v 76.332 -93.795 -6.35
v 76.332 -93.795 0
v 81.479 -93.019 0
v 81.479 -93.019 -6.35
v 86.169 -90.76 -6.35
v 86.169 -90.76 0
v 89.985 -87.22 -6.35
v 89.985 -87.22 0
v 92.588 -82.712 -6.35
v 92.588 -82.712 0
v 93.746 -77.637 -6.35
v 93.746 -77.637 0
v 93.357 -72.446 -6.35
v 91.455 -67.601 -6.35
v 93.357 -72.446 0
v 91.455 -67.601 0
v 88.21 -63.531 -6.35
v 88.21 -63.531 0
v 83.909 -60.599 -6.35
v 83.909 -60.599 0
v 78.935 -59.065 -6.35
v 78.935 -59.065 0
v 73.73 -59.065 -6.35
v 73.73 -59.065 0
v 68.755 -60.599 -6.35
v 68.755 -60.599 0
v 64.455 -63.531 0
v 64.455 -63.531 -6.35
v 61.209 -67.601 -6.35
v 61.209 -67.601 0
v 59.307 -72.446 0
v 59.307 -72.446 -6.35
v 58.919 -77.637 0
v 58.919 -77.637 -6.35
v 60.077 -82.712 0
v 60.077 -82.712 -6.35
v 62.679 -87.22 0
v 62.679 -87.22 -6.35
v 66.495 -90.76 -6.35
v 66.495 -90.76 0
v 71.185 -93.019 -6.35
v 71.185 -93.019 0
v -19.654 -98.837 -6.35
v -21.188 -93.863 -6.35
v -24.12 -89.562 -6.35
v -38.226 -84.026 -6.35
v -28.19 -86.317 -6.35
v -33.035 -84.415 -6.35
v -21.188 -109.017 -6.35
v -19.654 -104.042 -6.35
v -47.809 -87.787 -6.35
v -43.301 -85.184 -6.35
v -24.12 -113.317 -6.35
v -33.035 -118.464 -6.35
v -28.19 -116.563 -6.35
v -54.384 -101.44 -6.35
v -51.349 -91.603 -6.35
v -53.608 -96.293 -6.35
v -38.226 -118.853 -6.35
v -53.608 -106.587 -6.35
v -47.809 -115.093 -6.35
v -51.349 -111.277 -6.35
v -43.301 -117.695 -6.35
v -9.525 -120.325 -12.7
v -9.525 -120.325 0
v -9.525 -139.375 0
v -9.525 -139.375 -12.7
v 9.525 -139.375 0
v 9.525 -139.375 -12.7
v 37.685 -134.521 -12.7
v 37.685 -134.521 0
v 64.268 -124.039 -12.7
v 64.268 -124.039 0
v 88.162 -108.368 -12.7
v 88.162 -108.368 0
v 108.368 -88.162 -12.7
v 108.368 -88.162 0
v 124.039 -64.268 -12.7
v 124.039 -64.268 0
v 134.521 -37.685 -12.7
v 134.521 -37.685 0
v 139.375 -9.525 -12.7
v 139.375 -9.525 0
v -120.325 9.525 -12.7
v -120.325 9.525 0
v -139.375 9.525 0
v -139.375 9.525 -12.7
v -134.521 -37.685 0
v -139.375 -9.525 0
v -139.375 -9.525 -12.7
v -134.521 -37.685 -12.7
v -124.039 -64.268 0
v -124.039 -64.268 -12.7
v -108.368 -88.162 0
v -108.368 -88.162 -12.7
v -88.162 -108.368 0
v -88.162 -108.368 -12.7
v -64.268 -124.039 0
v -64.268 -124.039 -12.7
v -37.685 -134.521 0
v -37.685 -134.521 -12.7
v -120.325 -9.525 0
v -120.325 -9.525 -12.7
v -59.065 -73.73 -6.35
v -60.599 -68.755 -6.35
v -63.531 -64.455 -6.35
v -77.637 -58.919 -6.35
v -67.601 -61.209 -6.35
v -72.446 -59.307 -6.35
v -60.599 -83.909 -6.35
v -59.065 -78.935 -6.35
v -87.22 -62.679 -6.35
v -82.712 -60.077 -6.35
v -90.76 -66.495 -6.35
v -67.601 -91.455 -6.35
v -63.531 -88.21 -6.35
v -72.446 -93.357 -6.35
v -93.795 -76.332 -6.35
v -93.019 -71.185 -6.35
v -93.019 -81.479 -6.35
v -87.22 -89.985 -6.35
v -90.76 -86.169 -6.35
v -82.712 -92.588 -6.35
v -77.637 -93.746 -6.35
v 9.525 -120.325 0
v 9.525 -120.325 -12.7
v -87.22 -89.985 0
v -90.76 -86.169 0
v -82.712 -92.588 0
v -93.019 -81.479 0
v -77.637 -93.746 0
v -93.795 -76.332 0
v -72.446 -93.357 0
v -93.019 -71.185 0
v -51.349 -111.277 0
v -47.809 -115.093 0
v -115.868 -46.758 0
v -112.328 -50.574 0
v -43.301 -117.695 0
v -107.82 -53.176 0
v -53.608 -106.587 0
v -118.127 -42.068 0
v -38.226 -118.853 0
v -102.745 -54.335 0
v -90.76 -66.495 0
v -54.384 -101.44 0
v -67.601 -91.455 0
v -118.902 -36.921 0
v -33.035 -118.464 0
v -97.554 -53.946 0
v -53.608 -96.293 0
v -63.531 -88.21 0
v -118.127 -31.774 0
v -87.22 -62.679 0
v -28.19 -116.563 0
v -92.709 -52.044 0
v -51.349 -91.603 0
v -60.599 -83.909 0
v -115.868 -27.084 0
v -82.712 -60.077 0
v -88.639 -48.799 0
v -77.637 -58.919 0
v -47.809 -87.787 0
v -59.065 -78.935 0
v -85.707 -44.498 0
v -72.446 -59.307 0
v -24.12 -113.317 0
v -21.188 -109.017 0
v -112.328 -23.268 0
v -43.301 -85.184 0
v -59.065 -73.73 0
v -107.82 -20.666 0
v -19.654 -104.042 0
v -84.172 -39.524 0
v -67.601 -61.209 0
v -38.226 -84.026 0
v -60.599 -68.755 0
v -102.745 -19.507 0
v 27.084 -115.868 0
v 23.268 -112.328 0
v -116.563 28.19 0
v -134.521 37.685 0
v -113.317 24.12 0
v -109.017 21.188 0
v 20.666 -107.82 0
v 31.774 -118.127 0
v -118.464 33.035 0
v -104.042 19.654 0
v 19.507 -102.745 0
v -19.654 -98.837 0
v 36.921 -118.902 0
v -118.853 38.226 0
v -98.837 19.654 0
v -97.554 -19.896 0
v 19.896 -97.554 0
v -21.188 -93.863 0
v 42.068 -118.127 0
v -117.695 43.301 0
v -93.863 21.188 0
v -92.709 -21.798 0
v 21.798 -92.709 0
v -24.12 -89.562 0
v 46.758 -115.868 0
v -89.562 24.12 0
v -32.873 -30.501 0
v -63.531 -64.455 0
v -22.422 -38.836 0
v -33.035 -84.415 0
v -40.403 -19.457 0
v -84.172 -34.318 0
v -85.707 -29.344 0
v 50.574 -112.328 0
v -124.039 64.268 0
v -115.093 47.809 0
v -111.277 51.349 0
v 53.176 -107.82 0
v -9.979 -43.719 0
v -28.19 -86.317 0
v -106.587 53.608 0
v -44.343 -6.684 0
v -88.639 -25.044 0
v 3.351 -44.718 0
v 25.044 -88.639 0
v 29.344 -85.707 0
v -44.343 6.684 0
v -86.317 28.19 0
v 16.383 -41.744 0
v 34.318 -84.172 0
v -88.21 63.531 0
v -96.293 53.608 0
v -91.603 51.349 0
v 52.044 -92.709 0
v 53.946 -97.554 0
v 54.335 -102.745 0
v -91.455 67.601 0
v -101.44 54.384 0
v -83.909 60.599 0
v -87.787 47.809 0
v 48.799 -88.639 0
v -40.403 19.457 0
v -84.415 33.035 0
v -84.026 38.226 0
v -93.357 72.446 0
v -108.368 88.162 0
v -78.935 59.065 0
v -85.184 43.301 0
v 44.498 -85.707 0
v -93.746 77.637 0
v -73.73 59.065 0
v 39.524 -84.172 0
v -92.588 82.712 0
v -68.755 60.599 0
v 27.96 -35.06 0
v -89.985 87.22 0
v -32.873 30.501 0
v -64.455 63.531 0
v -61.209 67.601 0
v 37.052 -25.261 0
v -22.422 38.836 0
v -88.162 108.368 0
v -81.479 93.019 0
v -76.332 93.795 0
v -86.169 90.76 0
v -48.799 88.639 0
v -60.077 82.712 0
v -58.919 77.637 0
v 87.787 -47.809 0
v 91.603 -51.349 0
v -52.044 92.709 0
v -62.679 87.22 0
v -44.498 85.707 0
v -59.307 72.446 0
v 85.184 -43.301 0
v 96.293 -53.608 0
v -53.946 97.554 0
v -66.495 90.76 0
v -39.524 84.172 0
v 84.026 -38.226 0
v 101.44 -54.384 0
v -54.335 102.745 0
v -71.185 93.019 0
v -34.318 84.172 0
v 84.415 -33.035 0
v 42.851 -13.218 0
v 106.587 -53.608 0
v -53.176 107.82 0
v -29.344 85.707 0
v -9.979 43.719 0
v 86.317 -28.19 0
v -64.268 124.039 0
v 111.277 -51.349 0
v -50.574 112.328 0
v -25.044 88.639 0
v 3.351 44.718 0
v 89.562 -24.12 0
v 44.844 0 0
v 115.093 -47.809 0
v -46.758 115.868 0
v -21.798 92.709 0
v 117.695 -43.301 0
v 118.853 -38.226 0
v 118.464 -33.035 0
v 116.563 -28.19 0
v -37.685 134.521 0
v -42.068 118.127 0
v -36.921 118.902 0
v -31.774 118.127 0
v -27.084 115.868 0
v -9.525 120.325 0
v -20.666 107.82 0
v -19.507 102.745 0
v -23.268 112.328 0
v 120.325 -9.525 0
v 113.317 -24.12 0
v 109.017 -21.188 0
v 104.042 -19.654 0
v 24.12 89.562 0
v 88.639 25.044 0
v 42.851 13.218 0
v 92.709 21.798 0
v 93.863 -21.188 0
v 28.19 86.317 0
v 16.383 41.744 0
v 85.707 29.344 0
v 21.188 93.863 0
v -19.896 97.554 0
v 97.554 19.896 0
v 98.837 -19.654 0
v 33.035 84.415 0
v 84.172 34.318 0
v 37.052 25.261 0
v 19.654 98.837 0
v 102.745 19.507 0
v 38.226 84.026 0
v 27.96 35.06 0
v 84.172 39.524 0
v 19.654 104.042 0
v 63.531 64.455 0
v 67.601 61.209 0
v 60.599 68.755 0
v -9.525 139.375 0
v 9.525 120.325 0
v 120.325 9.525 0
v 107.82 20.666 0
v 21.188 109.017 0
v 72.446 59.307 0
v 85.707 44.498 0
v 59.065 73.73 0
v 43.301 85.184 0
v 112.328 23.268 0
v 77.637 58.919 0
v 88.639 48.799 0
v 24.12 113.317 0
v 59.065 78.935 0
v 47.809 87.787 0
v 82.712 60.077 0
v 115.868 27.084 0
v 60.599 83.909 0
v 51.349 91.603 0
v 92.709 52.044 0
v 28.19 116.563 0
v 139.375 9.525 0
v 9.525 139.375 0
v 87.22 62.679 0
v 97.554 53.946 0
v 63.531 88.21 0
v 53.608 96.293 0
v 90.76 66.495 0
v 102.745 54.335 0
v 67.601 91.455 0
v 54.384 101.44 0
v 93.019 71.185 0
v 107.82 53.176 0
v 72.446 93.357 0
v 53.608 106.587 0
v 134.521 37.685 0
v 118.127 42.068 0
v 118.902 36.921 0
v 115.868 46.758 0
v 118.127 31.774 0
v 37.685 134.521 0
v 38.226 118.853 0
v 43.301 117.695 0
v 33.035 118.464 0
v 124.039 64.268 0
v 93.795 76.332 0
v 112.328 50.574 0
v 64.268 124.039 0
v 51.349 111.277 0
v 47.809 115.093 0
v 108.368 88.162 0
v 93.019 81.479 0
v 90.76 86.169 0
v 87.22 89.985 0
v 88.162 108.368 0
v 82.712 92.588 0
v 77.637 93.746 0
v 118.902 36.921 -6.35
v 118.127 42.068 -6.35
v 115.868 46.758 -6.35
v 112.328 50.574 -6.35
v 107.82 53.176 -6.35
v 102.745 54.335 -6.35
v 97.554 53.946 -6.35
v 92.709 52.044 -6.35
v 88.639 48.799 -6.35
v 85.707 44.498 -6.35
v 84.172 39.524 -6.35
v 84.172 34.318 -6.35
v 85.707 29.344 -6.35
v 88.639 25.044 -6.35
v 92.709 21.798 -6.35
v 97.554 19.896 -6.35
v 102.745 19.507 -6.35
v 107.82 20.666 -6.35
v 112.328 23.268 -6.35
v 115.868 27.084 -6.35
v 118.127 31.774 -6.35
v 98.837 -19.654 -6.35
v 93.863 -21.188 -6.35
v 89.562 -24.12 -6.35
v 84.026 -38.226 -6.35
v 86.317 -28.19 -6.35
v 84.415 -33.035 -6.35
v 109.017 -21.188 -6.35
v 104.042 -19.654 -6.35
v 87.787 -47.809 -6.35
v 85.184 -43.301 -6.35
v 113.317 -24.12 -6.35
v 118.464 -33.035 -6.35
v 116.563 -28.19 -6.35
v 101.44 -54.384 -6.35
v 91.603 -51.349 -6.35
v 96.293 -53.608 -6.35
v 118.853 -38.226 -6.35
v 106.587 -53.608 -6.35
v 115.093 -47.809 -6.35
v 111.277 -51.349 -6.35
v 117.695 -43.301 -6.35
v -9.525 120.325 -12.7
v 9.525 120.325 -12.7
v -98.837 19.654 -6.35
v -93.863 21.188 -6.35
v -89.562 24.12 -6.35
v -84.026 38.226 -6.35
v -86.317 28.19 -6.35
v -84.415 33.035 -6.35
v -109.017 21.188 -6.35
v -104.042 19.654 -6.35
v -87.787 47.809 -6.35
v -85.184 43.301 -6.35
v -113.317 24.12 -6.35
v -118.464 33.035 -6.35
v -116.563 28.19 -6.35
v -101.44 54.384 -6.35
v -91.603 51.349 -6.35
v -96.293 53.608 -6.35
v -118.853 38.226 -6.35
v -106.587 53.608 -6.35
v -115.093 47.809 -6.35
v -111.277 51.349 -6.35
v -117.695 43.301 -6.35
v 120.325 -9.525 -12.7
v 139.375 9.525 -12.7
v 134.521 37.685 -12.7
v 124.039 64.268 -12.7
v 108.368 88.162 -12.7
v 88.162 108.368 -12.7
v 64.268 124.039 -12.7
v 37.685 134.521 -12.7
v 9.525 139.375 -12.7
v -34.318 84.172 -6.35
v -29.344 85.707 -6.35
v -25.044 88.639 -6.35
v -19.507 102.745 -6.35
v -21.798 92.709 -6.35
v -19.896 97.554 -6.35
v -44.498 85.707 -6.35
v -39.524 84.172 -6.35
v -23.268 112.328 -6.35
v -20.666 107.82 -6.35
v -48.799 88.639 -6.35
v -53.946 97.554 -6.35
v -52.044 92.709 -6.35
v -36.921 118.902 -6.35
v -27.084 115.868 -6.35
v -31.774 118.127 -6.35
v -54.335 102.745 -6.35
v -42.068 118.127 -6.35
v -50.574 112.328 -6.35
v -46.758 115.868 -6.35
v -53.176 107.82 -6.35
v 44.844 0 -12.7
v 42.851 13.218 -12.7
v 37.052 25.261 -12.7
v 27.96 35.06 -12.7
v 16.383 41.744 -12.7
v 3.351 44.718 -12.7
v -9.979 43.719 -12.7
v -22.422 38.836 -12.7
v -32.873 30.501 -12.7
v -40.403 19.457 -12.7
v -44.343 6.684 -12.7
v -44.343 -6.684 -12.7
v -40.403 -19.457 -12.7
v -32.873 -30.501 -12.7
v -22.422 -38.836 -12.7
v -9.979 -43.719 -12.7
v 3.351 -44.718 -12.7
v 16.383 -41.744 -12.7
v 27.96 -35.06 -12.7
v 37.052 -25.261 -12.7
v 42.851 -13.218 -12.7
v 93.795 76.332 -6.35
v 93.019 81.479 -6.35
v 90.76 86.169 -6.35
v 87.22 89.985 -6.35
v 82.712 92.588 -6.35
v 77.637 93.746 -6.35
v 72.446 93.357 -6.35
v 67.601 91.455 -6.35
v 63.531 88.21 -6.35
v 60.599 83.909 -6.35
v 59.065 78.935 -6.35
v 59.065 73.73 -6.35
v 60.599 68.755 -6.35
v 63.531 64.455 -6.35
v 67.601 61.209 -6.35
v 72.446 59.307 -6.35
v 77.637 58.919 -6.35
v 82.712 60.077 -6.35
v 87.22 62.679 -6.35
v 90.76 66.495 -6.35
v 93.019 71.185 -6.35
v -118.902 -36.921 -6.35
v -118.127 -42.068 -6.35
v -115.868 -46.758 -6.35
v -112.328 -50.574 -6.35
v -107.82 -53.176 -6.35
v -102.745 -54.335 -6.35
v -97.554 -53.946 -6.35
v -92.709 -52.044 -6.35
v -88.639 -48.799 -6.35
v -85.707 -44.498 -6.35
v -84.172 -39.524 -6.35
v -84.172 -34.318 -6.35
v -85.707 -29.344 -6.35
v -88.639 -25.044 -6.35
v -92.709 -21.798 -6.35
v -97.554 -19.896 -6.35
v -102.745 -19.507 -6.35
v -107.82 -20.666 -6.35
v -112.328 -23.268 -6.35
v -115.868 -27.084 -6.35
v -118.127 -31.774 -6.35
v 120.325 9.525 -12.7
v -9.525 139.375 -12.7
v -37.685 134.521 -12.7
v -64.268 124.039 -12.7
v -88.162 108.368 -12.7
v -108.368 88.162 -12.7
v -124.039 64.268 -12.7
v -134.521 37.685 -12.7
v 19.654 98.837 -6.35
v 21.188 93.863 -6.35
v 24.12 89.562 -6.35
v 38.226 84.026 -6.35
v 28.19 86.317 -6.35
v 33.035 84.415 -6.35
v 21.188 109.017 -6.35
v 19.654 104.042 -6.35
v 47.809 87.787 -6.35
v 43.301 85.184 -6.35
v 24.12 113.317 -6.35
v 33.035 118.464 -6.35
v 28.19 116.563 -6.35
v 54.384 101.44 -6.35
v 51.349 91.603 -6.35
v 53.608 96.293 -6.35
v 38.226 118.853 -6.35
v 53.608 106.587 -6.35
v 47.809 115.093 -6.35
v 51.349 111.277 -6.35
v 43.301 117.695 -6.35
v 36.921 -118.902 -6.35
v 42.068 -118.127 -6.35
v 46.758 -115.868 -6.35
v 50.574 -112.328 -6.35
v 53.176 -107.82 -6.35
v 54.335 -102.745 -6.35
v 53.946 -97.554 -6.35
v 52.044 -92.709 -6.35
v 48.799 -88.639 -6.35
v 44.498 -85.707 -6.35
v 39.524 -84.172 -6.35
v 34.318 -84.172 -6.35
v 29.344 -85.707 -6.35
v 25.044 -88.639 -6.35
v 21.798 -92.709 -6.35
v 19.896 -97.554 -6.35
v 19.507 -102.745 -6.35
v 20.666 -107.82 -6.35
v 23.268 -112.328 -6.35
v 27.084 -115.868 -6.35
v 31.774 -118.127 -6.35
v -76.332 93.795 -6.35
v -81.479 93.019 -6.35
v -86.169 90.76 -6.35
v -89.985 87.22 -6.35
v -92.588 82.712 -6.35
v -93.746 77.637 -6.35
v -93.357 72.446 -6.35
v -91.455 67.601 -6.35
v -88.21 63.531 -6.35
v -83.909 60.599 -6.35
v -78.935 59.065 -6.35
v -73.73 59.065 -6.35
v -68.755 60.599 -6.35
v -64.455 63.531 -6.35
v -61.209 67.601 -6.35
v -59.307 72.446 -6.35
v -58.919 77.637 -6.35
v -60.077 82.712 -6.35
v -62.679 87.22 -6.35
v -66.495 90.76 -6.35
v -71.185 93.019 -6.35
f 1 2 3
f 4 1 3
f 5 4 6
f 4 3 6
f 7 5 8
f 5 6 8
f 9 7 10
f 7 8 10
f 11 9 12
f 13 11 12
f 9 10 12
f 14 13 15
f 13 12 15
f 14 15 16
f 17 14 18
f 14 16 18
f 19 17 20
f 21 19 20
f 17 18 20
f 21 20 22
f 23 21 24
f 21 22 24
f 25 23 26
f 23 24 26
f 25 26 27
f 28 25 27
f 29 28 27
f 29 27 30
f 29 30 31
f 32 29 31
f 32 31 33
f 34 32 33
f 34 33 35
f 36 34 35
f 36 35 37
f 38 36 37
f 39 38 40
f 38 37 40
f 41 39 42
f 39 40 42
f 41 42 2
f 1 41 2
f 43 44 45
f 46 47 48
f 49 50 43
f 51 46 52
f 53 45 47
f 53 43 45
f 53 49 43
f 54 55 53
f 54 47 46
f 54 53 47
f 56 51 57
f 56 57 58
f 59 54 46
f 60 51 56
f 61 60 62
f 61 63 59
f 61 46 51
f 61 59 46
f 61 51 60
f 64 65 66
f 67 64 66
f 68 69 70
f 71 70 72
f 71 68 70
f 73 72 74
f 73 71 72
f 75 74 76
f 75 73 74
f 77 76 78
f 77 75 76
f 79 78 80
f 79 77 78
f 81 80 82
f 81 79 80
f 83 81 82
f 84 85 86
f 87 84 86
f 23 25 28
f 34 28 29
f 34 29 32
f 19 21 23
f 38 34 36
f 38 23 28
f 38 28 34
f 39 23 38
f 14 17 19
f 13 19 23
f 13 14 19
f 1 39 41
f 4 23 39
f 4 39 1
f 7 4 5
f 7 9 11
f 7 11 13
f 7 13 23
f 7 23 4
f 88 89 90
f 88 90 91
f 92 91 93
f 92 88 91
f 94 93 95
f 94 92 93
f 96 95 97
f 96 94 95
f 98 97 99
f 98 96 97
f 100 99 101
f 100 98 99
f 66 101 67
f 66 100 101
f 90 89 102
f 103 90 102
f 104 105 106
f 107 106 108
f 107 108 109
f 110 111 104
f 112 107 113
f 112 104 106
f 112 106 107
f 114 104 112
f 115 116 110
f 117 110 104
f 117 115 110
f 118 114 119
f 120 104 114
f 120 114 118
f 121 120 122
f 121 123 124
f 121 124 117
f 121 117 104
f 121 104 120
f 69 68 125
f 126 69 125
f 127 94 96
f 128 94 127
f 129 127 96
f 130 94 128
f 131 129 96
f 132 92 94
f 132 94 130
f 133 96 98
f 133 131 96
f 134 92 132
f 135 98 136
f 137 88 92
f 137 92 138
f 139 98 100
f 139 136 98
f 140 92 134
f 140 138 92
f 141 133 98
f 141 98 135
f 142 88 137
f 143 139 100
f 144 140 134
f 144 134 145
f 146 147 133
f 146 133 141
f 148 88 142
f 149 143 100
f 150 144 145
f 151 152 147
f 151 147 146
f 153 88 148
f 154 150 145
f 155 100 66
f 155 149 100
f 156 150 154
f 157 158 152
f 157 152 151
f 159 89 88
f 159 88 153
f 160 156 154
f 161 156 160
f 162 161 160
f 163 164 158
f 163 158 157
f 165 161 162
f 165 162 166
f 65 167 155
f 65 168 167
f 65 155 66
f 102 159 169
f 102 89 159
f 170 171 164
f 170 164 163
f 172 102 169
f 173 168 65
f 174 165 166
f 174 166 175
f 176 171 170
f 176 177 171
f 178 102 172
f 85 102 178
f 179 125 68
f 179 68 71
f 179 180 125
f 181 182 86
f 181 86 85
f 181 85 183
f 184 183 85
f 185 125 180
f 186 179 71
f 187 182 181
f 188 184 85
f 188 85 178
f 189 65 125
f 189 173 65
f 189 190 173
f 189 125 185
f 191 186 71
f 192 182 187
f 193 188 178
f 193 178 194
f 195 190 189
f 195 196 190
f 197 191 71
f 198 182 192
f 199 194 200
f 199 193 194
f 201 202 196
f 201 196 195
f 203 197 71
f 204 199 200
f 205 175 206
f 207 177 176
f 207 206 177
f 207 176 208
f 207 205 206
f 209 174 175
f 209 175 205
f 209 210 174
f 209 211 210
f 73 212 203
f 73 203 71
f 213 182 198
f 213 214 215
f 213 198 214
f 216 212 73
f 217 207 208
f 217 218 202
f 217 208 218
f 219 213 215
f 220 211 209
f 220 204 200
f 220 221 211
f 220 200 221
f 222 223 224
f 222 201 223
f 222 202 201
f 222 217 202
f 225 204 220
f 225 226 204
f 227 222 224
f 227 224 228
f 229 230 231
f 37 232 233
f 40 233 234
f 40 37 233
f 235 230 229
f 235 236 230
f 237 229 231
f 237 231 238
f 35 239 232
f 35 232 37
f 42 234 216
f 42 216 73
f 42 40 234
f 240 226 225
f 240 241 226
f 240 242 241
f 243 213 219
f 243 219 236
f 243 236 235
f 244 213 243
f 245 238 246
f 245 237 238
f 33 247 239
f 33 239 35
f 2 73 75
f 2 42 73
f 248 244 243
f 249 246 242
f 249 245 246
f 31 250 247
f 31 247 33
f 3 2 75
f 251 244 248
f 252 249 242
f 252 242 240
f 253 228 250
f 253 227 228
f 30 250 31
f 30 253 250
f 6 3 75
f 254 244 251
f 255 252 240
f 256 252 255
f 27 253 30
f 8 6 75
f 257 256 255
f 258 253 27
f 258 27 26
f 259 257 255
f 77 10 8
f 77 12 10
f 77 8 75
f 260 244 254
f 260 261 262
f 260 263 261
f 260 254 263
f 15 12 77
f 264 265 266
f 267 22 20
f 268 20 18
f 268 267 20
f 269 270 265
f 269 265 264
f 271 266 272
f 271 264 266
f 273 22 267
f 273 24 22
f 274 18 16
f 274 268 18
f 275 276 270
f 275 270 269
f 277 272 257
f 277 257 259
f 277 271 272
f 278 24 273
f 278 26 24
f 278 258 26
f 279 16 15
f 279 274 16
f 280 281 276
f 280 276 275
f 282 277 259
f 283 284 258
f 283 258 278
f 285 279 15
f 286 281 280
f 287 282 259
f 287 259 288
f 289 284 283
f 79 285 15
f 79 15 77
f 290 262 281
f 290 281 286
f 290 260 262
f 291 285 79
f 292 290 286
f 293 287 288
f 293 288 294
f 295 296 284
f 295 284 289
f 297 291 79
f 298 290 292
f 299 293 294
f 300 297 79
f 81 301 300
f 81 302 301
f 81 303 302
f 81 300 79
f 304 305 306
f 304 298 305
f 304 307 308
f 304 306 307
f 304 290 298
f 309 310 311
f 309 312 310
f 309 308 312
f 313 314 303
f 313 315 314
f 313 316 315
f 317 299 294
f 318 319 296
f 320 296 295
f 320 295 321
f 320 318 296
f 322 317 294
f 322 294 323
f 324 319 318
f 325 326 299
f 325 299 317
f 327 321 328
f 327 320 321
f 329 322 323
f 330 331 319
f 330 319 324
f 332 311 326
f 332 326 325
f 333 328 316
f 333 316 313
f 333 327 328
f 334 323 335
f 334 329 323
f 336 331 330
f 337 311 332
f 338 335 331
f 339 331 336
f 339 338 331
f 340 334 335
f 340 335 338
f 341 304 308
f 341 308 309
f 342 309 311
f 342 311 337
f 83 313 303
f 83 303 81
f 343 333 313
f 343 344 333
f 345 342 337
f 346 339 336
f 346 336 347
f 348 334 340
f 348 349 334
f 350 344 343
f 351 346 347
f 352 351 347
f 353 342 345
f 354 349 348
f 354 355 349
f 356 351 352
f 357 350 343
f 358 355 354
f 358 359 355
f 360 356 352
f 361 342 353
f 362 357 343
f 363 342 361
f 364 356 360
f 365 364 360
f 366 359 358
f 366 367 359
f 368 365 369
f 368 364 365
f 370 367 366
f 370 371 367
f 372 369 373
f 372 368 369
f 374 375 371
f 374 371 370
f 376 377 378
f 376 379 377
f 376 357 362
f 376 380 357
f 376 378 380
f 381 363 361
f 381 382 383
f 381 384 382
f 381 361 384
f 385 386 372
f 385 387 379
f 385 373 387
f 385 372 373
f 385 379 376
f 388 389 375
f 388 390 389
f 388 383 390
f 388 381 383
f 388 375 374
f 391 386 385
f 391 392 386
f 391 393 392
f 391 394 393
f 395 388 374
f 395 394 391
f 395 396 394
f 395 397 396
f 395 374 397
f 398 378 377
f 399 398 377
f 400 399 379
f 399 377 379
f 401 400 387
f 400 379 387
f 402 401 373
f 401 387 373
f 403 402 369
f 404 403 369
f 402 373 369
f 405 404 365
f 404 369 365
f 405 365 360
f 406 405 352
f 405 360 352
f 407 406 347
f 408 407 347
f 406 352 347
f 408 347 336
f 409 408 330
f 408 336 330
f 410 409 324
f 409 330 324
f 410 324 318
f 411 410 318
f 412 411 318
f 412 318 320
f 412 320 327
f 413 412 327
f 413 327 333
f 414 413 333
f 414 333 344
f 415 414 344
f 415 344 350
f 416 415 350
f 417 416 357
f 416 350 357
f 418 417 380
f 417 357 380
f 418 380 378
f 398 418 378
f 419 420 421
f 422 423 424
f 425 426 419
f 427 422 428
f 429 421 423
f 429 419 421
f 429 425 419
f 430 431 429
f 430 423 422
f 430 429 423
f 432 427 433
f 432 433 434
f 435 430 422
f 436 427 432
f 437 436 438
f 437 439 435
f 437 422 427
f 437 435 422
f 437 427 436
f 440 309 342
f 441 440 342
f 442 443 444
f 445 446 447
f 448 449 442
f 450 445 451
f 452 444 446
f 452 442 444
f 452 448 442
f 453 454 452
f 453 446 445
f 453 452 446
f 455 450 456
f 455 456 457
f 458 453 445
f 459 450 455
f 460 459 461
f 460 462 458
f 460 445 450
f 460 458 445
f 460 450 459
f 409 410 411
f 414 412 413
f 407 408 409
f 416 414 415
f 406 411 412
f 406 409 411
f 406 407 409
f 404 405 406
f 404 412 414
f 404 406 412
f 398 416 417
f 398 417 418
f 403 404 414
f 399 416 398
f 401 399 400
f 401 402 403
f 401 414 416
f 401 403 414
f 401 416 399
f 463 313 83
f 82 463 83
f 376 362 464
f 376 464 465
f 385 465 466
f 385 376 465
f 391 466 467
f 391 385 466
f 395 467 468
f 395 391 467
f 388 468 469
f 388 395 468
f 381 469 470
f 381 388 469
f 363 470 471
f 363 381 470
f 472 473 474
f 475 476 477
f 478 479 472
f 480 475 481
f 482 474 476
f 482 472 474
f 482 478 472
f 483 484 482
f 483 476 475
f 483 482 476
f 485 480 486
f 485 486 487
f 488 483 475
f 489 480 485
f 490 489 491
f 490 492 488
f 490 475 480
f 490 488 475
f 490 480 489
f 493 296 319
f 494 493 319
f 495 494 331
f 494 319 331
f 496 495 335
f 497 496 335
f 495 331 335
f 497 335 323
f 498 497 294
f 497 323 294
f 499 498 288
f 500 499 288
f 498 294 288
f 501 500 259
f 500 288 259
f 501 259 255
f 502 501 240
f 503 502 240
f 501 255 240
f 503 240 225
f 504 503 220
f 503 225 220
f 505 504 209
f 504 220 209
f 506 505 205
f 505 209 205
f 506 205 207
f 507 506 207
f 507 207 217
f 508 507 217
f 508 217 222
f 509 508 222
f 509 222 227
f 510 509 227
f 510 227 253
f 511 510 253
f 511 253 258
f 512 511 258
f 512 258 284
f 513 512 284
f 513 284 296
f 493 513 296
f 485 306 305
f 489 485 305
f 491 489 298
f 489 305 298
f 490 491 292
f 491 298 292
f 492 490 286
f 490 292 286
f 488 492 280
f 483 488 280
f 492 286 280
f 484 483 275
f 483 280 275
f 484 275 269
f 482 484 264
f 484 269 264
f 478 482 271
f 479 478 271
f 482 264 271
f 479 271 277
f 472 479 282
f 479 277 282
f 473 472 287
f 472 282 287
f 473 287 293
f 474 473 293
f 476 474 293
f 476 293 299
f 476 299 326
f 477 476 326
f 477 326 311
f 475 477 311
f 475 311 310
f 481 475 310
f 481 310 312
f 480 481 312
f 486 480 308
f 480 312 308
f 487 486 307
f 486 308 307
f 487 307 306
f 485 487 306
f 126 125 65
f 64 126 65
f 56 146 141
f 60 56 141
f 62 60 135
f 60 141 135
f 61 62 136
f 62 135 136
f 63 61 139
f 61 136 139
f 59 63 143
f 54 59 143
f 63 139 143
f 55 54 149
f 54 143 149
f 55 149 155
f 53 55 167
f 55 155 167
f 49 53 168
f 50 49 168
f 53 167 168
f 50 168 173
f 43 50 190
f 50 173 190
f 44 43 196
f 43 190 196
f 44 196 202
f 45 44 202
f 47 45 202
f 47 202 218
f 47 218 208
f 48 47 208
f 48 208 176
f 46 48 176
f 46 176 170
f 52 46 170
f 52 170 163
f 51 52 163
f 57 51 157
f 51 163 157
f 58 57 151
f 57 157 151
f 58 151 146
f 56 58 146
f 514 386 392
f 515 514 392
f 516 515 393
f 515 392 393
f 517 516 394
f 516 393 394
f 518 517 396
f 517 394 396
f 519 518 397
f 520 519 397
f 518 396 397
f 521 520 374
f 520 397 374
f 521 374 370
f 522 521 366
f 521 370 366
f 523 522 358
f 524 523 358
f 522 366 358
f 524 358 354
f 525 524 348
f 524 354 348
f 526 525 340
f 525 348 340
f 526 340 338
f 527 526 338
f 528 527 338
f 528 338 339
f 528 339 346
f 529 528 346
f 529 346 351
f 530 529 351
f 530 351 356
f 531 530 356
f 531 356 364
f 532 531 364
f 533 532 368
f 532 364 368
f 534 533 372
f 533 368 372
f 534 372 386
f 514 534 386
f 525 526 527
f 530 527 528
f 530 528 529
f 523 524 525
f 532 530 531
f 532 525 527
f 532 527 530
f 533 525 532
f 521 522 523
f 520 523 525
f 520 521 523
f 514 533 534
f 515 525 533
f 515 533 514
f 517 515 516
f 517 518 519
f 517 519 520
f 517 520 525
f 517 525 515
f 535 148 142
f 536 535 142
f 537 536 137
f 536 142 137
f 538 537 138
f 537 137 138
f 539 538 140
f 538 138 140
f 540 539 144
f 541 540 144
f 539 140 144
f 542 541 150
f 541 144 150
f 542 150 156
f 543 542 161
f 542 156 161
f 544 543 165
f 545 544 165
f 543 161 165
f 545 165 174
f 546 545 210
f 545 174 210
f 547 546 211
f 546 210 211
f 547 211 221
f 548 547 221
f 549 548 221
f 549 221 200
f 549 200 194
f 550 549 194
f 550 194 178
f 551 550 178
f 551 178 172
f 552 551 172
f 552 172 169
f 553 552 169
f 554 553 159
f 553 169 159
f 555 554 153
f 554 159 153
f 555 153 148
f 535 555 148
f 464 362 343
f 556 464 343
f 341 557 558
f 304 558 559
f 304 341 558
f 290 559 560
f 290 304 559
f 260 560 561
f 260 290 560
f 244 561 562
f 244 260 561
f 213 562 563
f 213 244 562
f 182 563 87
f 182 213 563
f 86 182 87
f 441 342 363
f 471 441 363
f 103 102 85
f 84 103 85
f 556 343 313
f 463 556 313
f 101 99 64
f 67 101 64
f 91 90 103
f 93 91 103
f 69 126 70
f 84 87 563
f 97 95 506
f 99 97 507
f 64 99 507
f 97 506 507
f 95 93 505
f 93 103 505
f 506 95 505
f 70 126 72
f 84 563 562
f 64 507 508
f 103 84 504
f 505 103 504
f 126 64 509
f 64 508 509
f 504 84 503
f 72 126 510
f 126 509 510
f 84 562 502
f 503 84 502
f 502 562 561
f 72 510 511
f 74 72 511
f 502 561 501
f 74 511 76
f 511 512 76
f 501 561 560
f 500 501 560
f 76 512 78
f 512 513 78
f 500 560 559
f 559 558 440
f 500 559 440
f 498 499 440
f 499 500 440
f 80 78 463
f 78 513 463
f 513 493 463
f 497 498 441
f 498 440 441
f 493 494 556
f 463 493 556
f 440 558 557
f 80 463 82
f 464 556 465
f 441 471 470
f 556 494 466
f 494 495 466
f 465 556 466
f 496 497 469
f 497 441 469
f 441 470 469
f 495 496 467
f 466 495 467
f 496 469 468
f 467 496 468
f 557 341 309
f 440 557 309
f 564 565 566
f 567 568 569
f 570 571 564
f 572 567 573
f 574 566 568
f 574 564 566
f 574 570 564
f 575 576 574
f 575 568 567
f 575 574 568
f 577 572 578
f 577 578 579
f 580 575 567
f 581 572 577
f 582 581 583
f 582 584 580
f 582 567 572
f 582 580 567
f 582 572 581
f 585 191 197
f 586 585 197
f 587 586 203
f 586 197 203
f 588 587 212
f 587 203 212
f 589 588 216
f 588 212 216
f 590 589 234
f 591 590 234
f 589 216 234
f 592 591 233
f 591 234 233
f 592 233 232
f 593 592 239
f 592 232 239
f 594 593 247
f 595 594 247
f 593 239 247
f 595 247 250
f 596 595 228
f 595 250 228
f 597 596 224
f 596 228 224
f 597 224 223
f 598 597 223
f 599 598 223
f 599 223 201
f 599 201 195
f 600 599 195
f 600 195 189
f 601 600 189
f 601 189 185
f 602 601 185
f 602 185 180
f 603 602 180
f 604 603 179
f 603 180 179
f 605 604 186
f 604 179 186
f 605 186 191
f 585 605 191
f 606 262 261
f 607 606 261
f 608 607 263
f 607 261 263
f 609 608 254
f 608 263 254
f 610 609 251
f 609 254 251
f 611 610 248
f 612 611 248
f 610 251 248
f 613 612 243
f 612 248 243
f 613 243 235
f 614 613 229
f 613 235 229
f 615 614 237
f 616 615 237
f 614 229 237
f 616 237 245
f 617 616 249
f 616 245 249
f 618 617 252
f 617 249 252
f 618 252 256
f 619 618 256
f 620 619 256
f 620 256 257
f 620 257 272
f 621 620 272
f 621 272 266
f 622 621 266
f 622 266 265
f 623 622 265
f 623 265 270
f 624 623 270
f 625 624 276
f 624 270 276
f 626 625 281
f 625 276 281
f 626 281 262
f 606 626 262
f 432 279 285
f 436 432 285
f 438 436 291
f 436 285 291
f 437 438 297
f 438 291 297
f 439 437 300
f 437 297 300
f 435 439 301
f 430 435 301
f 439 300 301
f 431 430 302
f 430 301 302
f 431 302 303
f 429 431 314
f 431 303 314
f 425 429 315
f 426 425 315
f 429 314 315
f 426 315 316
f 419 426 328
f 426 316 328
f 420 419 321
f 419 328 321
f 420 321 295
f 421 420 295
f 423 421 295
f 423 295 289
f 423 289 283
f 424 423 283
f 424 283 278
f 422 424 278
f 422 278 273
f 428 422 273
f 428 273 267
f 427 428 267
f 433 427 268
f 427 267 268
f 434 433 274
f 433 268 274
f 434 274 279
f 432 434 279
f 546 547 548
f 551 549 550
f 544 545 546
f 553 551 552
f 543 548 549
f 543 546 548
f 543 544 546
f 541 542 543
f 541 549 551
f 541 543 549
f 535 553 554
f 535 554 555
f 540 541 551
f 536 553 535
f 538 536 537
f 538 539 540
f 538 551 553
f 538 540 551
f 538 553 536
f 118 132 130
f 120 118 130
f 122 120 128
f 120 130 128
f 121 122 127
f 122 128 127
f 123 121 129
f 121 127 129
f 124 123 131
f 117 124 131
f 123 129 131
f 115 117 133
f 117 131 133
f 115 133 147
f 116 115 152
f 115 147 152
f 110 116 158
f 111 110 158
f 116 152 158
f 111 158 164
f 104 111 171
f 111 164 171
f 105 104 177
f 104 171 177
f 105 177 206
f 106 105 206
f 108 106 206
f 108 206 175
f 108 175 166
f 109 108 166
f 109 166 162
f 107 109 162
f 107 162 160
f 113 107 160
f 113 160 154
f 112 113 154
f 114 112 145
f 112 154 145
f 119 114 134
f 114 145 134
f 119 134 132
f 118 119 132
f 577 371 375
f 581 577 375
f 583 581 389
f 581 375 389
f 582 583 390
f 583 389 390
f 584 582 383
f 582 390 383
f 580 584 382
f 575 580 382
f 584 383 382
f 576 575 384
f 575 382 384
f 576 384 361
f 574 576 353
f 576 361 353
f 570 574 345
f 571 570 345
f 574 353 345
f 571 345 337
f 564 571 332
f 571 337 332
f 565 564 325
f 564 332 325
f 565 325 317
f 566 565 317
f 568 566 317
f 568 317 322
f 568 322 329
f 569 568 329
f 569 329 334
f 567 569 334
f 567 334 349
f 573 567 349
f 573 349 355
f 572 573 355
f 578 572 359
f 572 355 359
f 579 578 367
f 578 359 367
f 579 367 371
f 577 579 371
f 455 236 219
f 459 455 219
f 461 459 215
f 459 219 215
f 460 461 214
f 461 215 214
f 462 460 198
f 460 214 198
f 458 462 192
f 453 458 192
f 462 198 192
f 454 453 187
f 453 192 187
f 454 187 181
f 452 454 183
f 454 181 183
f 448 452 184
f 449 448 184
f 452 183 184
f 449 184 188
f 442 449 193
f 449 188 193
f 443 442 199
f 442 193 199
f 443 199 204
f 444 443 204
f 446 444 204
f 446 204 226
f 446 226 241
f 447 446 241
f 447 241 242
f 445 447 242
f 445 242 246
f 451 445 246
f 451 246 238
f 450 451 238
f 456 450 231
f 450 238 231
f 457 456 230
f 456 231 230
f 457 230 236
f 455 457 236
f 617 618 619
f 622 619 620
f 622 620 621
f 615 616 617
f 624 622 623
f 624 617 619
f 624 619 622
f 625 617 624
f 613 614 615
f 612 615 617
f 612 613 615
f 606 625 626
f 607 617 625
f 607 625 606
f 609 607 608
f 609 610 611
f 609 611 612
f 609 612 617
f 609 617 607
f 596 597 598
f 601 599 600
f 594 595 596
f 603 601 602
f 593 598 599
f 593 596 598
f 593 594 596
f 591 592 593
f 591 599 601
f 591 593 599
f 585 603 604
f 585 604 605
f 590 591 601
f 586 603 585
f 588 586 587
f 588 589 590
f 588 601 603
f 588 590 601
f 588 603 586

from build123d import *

# Parameters (mm, degrees)
F0_R            = 44.8437
F0_R_2          = 17.4625
F0_W            = 19.05
F0_H            = 6.35
F1_DEPTH        = 12.7
F2_DEPTH        = 6.35
F2_COPIES_COUNT = 4
F3_DEPTH        = 12.701
F3_COPIES_COUNT = 4
F5_DEPTH        = 25.4


# Not quite as in the source:
# - a pattern or mirror of a feature is missing from the dataset's text; its kind, count and spacing are read off the source's solid


with BuildPart() as f1:
    # F0 (on Top) → F1 (new body)
    with BuildSketch(Plane.XY):
        with BuildLine():
            ThreePointArc((-9.525, 139.3749058296), (-95.3557746023, -102.0948884617), (139.7, 0))
            ThreePointArc((139.7, 0), (102.0948884617, 95.3557746023), (9.525, 139.3749058296))
            Line((9.525, 139.3749058296), (9.525, 120.3249058296))
            Line((9.525, 120.3249058296), (9.525, 113.9749058296))
            Line((9.525, 113.9749058296), (-9.525, 113.9749058296))
            Line((-9.525, 113.9749058296), (-9.525, 120.3249058296))
            Line((-9.525, 120.3249058296), (-9.525, 139.3749058296))
        make_face()
        Circle(F0_R, mode=Mode.SUBTRACT)
        with Locations((101.4398184138, 36.921074472)):
            Circle(F0_R_2, mode=Mode.SUBTRACT)
        with Locations((36.921074472, 101.4398184138)):
            Circle(F0_R_2, mode=Mode.SUBTRACT)
        with Locations((76.3321770291, 76.3321770291)):
            Circle(F0_R_2, mode=Mode.SUBTRACT)
        with BuildLine():
            Line((9.525, 120.3249058296), (9.525, 139.3749058296))
            ThreePointArc((9.525, 139.3749058296), (0, 139.7), (-9.525, 139.3749058296))
            Line((-9.525, 139.3749058296), (-9.525, 120.3249058296))
            Line((-9.525, 120.3249058296), (9.525, 120.3249058296))
        make_face()
        with Locations((36.921074472, 101.4398184138)):
            Circle(F0_R_2)
        with Locations((76.3321770291, 76.3321770291)):
            Circle(F0_R_2)
        with Locations((101.4398184138, 36.921074472)):
            Circle(F0_R_2)
        with Locations((0, 117.1499058296)):
            Rectangle(F0_W, F0_H)
        Circle(F0_R)
    extrude(amount=-F1_DEPTH)

    # F0 (on Top) → F2 (cut)
    with BuildSketch(Plane.XY):
        with Locations((36.921074472, 101.4398184138)):
            Circle(F0_R_2)
        with Locations((76.3321770291, 76.3321770291)):
            Circle(F0_R_2)
        with Locations((101.4398184138, 36.921074472)):
            Circle(F0_R_2)
    f2 = extrude(amount=-F2_DEPTH, mode=Mode.SUBTRACT)

    # F2_copies: F2 ×4 about axis
    f2_copies_axis = Axis((0, 0, 0), (0, 0, 1))
    for i in range(1, F2_COPIES_COUNT):
        add(f2.rotate(f2_copies_axis, i * 360 / F2_COPIES_COUNT), mode=Mode.SUBTRACT)

    # F0 (on Top) → F3 (cut, through all)
    with BuildSketch(Plane.XY):
        with BuildLine():
            Line((9.525, 120.3249058296), (9.525, 139.3749058296))
            ThreePointArc((9.525, 139.3749058296), (0, 139.7), (-9.525, 139.3749058296))
            Line((-9.525, 139.3749058296), (-9.525, 120.3249058296))
            Line((-9.525, 120.3249058296), (9.525, 120.3249058296))
        make_face()
    f3 = extrude(amount=-F3_DEPTH, mode=Mode.SUBTRACT)

    # F3_copies: F3 ×4 about axis
    f3_copies_axis = Axis((0, 0, 0), (0, 0, 1))
    for i in range(1, F3_COPIES_COUNT):
        add(f3.rotate(f3_copies_axis, i * 360 / F3_COPIES_COUNT), mode=Mode.SUBTRACT)

    # F0 (on Top) → F5 (cut)
    with BuildSketch(Plane.XY):
        Circle(F0_R)
    extrude(amount=-F5_DEPTH, mode=Mode.SUBTRACT)


solid = f1.part
